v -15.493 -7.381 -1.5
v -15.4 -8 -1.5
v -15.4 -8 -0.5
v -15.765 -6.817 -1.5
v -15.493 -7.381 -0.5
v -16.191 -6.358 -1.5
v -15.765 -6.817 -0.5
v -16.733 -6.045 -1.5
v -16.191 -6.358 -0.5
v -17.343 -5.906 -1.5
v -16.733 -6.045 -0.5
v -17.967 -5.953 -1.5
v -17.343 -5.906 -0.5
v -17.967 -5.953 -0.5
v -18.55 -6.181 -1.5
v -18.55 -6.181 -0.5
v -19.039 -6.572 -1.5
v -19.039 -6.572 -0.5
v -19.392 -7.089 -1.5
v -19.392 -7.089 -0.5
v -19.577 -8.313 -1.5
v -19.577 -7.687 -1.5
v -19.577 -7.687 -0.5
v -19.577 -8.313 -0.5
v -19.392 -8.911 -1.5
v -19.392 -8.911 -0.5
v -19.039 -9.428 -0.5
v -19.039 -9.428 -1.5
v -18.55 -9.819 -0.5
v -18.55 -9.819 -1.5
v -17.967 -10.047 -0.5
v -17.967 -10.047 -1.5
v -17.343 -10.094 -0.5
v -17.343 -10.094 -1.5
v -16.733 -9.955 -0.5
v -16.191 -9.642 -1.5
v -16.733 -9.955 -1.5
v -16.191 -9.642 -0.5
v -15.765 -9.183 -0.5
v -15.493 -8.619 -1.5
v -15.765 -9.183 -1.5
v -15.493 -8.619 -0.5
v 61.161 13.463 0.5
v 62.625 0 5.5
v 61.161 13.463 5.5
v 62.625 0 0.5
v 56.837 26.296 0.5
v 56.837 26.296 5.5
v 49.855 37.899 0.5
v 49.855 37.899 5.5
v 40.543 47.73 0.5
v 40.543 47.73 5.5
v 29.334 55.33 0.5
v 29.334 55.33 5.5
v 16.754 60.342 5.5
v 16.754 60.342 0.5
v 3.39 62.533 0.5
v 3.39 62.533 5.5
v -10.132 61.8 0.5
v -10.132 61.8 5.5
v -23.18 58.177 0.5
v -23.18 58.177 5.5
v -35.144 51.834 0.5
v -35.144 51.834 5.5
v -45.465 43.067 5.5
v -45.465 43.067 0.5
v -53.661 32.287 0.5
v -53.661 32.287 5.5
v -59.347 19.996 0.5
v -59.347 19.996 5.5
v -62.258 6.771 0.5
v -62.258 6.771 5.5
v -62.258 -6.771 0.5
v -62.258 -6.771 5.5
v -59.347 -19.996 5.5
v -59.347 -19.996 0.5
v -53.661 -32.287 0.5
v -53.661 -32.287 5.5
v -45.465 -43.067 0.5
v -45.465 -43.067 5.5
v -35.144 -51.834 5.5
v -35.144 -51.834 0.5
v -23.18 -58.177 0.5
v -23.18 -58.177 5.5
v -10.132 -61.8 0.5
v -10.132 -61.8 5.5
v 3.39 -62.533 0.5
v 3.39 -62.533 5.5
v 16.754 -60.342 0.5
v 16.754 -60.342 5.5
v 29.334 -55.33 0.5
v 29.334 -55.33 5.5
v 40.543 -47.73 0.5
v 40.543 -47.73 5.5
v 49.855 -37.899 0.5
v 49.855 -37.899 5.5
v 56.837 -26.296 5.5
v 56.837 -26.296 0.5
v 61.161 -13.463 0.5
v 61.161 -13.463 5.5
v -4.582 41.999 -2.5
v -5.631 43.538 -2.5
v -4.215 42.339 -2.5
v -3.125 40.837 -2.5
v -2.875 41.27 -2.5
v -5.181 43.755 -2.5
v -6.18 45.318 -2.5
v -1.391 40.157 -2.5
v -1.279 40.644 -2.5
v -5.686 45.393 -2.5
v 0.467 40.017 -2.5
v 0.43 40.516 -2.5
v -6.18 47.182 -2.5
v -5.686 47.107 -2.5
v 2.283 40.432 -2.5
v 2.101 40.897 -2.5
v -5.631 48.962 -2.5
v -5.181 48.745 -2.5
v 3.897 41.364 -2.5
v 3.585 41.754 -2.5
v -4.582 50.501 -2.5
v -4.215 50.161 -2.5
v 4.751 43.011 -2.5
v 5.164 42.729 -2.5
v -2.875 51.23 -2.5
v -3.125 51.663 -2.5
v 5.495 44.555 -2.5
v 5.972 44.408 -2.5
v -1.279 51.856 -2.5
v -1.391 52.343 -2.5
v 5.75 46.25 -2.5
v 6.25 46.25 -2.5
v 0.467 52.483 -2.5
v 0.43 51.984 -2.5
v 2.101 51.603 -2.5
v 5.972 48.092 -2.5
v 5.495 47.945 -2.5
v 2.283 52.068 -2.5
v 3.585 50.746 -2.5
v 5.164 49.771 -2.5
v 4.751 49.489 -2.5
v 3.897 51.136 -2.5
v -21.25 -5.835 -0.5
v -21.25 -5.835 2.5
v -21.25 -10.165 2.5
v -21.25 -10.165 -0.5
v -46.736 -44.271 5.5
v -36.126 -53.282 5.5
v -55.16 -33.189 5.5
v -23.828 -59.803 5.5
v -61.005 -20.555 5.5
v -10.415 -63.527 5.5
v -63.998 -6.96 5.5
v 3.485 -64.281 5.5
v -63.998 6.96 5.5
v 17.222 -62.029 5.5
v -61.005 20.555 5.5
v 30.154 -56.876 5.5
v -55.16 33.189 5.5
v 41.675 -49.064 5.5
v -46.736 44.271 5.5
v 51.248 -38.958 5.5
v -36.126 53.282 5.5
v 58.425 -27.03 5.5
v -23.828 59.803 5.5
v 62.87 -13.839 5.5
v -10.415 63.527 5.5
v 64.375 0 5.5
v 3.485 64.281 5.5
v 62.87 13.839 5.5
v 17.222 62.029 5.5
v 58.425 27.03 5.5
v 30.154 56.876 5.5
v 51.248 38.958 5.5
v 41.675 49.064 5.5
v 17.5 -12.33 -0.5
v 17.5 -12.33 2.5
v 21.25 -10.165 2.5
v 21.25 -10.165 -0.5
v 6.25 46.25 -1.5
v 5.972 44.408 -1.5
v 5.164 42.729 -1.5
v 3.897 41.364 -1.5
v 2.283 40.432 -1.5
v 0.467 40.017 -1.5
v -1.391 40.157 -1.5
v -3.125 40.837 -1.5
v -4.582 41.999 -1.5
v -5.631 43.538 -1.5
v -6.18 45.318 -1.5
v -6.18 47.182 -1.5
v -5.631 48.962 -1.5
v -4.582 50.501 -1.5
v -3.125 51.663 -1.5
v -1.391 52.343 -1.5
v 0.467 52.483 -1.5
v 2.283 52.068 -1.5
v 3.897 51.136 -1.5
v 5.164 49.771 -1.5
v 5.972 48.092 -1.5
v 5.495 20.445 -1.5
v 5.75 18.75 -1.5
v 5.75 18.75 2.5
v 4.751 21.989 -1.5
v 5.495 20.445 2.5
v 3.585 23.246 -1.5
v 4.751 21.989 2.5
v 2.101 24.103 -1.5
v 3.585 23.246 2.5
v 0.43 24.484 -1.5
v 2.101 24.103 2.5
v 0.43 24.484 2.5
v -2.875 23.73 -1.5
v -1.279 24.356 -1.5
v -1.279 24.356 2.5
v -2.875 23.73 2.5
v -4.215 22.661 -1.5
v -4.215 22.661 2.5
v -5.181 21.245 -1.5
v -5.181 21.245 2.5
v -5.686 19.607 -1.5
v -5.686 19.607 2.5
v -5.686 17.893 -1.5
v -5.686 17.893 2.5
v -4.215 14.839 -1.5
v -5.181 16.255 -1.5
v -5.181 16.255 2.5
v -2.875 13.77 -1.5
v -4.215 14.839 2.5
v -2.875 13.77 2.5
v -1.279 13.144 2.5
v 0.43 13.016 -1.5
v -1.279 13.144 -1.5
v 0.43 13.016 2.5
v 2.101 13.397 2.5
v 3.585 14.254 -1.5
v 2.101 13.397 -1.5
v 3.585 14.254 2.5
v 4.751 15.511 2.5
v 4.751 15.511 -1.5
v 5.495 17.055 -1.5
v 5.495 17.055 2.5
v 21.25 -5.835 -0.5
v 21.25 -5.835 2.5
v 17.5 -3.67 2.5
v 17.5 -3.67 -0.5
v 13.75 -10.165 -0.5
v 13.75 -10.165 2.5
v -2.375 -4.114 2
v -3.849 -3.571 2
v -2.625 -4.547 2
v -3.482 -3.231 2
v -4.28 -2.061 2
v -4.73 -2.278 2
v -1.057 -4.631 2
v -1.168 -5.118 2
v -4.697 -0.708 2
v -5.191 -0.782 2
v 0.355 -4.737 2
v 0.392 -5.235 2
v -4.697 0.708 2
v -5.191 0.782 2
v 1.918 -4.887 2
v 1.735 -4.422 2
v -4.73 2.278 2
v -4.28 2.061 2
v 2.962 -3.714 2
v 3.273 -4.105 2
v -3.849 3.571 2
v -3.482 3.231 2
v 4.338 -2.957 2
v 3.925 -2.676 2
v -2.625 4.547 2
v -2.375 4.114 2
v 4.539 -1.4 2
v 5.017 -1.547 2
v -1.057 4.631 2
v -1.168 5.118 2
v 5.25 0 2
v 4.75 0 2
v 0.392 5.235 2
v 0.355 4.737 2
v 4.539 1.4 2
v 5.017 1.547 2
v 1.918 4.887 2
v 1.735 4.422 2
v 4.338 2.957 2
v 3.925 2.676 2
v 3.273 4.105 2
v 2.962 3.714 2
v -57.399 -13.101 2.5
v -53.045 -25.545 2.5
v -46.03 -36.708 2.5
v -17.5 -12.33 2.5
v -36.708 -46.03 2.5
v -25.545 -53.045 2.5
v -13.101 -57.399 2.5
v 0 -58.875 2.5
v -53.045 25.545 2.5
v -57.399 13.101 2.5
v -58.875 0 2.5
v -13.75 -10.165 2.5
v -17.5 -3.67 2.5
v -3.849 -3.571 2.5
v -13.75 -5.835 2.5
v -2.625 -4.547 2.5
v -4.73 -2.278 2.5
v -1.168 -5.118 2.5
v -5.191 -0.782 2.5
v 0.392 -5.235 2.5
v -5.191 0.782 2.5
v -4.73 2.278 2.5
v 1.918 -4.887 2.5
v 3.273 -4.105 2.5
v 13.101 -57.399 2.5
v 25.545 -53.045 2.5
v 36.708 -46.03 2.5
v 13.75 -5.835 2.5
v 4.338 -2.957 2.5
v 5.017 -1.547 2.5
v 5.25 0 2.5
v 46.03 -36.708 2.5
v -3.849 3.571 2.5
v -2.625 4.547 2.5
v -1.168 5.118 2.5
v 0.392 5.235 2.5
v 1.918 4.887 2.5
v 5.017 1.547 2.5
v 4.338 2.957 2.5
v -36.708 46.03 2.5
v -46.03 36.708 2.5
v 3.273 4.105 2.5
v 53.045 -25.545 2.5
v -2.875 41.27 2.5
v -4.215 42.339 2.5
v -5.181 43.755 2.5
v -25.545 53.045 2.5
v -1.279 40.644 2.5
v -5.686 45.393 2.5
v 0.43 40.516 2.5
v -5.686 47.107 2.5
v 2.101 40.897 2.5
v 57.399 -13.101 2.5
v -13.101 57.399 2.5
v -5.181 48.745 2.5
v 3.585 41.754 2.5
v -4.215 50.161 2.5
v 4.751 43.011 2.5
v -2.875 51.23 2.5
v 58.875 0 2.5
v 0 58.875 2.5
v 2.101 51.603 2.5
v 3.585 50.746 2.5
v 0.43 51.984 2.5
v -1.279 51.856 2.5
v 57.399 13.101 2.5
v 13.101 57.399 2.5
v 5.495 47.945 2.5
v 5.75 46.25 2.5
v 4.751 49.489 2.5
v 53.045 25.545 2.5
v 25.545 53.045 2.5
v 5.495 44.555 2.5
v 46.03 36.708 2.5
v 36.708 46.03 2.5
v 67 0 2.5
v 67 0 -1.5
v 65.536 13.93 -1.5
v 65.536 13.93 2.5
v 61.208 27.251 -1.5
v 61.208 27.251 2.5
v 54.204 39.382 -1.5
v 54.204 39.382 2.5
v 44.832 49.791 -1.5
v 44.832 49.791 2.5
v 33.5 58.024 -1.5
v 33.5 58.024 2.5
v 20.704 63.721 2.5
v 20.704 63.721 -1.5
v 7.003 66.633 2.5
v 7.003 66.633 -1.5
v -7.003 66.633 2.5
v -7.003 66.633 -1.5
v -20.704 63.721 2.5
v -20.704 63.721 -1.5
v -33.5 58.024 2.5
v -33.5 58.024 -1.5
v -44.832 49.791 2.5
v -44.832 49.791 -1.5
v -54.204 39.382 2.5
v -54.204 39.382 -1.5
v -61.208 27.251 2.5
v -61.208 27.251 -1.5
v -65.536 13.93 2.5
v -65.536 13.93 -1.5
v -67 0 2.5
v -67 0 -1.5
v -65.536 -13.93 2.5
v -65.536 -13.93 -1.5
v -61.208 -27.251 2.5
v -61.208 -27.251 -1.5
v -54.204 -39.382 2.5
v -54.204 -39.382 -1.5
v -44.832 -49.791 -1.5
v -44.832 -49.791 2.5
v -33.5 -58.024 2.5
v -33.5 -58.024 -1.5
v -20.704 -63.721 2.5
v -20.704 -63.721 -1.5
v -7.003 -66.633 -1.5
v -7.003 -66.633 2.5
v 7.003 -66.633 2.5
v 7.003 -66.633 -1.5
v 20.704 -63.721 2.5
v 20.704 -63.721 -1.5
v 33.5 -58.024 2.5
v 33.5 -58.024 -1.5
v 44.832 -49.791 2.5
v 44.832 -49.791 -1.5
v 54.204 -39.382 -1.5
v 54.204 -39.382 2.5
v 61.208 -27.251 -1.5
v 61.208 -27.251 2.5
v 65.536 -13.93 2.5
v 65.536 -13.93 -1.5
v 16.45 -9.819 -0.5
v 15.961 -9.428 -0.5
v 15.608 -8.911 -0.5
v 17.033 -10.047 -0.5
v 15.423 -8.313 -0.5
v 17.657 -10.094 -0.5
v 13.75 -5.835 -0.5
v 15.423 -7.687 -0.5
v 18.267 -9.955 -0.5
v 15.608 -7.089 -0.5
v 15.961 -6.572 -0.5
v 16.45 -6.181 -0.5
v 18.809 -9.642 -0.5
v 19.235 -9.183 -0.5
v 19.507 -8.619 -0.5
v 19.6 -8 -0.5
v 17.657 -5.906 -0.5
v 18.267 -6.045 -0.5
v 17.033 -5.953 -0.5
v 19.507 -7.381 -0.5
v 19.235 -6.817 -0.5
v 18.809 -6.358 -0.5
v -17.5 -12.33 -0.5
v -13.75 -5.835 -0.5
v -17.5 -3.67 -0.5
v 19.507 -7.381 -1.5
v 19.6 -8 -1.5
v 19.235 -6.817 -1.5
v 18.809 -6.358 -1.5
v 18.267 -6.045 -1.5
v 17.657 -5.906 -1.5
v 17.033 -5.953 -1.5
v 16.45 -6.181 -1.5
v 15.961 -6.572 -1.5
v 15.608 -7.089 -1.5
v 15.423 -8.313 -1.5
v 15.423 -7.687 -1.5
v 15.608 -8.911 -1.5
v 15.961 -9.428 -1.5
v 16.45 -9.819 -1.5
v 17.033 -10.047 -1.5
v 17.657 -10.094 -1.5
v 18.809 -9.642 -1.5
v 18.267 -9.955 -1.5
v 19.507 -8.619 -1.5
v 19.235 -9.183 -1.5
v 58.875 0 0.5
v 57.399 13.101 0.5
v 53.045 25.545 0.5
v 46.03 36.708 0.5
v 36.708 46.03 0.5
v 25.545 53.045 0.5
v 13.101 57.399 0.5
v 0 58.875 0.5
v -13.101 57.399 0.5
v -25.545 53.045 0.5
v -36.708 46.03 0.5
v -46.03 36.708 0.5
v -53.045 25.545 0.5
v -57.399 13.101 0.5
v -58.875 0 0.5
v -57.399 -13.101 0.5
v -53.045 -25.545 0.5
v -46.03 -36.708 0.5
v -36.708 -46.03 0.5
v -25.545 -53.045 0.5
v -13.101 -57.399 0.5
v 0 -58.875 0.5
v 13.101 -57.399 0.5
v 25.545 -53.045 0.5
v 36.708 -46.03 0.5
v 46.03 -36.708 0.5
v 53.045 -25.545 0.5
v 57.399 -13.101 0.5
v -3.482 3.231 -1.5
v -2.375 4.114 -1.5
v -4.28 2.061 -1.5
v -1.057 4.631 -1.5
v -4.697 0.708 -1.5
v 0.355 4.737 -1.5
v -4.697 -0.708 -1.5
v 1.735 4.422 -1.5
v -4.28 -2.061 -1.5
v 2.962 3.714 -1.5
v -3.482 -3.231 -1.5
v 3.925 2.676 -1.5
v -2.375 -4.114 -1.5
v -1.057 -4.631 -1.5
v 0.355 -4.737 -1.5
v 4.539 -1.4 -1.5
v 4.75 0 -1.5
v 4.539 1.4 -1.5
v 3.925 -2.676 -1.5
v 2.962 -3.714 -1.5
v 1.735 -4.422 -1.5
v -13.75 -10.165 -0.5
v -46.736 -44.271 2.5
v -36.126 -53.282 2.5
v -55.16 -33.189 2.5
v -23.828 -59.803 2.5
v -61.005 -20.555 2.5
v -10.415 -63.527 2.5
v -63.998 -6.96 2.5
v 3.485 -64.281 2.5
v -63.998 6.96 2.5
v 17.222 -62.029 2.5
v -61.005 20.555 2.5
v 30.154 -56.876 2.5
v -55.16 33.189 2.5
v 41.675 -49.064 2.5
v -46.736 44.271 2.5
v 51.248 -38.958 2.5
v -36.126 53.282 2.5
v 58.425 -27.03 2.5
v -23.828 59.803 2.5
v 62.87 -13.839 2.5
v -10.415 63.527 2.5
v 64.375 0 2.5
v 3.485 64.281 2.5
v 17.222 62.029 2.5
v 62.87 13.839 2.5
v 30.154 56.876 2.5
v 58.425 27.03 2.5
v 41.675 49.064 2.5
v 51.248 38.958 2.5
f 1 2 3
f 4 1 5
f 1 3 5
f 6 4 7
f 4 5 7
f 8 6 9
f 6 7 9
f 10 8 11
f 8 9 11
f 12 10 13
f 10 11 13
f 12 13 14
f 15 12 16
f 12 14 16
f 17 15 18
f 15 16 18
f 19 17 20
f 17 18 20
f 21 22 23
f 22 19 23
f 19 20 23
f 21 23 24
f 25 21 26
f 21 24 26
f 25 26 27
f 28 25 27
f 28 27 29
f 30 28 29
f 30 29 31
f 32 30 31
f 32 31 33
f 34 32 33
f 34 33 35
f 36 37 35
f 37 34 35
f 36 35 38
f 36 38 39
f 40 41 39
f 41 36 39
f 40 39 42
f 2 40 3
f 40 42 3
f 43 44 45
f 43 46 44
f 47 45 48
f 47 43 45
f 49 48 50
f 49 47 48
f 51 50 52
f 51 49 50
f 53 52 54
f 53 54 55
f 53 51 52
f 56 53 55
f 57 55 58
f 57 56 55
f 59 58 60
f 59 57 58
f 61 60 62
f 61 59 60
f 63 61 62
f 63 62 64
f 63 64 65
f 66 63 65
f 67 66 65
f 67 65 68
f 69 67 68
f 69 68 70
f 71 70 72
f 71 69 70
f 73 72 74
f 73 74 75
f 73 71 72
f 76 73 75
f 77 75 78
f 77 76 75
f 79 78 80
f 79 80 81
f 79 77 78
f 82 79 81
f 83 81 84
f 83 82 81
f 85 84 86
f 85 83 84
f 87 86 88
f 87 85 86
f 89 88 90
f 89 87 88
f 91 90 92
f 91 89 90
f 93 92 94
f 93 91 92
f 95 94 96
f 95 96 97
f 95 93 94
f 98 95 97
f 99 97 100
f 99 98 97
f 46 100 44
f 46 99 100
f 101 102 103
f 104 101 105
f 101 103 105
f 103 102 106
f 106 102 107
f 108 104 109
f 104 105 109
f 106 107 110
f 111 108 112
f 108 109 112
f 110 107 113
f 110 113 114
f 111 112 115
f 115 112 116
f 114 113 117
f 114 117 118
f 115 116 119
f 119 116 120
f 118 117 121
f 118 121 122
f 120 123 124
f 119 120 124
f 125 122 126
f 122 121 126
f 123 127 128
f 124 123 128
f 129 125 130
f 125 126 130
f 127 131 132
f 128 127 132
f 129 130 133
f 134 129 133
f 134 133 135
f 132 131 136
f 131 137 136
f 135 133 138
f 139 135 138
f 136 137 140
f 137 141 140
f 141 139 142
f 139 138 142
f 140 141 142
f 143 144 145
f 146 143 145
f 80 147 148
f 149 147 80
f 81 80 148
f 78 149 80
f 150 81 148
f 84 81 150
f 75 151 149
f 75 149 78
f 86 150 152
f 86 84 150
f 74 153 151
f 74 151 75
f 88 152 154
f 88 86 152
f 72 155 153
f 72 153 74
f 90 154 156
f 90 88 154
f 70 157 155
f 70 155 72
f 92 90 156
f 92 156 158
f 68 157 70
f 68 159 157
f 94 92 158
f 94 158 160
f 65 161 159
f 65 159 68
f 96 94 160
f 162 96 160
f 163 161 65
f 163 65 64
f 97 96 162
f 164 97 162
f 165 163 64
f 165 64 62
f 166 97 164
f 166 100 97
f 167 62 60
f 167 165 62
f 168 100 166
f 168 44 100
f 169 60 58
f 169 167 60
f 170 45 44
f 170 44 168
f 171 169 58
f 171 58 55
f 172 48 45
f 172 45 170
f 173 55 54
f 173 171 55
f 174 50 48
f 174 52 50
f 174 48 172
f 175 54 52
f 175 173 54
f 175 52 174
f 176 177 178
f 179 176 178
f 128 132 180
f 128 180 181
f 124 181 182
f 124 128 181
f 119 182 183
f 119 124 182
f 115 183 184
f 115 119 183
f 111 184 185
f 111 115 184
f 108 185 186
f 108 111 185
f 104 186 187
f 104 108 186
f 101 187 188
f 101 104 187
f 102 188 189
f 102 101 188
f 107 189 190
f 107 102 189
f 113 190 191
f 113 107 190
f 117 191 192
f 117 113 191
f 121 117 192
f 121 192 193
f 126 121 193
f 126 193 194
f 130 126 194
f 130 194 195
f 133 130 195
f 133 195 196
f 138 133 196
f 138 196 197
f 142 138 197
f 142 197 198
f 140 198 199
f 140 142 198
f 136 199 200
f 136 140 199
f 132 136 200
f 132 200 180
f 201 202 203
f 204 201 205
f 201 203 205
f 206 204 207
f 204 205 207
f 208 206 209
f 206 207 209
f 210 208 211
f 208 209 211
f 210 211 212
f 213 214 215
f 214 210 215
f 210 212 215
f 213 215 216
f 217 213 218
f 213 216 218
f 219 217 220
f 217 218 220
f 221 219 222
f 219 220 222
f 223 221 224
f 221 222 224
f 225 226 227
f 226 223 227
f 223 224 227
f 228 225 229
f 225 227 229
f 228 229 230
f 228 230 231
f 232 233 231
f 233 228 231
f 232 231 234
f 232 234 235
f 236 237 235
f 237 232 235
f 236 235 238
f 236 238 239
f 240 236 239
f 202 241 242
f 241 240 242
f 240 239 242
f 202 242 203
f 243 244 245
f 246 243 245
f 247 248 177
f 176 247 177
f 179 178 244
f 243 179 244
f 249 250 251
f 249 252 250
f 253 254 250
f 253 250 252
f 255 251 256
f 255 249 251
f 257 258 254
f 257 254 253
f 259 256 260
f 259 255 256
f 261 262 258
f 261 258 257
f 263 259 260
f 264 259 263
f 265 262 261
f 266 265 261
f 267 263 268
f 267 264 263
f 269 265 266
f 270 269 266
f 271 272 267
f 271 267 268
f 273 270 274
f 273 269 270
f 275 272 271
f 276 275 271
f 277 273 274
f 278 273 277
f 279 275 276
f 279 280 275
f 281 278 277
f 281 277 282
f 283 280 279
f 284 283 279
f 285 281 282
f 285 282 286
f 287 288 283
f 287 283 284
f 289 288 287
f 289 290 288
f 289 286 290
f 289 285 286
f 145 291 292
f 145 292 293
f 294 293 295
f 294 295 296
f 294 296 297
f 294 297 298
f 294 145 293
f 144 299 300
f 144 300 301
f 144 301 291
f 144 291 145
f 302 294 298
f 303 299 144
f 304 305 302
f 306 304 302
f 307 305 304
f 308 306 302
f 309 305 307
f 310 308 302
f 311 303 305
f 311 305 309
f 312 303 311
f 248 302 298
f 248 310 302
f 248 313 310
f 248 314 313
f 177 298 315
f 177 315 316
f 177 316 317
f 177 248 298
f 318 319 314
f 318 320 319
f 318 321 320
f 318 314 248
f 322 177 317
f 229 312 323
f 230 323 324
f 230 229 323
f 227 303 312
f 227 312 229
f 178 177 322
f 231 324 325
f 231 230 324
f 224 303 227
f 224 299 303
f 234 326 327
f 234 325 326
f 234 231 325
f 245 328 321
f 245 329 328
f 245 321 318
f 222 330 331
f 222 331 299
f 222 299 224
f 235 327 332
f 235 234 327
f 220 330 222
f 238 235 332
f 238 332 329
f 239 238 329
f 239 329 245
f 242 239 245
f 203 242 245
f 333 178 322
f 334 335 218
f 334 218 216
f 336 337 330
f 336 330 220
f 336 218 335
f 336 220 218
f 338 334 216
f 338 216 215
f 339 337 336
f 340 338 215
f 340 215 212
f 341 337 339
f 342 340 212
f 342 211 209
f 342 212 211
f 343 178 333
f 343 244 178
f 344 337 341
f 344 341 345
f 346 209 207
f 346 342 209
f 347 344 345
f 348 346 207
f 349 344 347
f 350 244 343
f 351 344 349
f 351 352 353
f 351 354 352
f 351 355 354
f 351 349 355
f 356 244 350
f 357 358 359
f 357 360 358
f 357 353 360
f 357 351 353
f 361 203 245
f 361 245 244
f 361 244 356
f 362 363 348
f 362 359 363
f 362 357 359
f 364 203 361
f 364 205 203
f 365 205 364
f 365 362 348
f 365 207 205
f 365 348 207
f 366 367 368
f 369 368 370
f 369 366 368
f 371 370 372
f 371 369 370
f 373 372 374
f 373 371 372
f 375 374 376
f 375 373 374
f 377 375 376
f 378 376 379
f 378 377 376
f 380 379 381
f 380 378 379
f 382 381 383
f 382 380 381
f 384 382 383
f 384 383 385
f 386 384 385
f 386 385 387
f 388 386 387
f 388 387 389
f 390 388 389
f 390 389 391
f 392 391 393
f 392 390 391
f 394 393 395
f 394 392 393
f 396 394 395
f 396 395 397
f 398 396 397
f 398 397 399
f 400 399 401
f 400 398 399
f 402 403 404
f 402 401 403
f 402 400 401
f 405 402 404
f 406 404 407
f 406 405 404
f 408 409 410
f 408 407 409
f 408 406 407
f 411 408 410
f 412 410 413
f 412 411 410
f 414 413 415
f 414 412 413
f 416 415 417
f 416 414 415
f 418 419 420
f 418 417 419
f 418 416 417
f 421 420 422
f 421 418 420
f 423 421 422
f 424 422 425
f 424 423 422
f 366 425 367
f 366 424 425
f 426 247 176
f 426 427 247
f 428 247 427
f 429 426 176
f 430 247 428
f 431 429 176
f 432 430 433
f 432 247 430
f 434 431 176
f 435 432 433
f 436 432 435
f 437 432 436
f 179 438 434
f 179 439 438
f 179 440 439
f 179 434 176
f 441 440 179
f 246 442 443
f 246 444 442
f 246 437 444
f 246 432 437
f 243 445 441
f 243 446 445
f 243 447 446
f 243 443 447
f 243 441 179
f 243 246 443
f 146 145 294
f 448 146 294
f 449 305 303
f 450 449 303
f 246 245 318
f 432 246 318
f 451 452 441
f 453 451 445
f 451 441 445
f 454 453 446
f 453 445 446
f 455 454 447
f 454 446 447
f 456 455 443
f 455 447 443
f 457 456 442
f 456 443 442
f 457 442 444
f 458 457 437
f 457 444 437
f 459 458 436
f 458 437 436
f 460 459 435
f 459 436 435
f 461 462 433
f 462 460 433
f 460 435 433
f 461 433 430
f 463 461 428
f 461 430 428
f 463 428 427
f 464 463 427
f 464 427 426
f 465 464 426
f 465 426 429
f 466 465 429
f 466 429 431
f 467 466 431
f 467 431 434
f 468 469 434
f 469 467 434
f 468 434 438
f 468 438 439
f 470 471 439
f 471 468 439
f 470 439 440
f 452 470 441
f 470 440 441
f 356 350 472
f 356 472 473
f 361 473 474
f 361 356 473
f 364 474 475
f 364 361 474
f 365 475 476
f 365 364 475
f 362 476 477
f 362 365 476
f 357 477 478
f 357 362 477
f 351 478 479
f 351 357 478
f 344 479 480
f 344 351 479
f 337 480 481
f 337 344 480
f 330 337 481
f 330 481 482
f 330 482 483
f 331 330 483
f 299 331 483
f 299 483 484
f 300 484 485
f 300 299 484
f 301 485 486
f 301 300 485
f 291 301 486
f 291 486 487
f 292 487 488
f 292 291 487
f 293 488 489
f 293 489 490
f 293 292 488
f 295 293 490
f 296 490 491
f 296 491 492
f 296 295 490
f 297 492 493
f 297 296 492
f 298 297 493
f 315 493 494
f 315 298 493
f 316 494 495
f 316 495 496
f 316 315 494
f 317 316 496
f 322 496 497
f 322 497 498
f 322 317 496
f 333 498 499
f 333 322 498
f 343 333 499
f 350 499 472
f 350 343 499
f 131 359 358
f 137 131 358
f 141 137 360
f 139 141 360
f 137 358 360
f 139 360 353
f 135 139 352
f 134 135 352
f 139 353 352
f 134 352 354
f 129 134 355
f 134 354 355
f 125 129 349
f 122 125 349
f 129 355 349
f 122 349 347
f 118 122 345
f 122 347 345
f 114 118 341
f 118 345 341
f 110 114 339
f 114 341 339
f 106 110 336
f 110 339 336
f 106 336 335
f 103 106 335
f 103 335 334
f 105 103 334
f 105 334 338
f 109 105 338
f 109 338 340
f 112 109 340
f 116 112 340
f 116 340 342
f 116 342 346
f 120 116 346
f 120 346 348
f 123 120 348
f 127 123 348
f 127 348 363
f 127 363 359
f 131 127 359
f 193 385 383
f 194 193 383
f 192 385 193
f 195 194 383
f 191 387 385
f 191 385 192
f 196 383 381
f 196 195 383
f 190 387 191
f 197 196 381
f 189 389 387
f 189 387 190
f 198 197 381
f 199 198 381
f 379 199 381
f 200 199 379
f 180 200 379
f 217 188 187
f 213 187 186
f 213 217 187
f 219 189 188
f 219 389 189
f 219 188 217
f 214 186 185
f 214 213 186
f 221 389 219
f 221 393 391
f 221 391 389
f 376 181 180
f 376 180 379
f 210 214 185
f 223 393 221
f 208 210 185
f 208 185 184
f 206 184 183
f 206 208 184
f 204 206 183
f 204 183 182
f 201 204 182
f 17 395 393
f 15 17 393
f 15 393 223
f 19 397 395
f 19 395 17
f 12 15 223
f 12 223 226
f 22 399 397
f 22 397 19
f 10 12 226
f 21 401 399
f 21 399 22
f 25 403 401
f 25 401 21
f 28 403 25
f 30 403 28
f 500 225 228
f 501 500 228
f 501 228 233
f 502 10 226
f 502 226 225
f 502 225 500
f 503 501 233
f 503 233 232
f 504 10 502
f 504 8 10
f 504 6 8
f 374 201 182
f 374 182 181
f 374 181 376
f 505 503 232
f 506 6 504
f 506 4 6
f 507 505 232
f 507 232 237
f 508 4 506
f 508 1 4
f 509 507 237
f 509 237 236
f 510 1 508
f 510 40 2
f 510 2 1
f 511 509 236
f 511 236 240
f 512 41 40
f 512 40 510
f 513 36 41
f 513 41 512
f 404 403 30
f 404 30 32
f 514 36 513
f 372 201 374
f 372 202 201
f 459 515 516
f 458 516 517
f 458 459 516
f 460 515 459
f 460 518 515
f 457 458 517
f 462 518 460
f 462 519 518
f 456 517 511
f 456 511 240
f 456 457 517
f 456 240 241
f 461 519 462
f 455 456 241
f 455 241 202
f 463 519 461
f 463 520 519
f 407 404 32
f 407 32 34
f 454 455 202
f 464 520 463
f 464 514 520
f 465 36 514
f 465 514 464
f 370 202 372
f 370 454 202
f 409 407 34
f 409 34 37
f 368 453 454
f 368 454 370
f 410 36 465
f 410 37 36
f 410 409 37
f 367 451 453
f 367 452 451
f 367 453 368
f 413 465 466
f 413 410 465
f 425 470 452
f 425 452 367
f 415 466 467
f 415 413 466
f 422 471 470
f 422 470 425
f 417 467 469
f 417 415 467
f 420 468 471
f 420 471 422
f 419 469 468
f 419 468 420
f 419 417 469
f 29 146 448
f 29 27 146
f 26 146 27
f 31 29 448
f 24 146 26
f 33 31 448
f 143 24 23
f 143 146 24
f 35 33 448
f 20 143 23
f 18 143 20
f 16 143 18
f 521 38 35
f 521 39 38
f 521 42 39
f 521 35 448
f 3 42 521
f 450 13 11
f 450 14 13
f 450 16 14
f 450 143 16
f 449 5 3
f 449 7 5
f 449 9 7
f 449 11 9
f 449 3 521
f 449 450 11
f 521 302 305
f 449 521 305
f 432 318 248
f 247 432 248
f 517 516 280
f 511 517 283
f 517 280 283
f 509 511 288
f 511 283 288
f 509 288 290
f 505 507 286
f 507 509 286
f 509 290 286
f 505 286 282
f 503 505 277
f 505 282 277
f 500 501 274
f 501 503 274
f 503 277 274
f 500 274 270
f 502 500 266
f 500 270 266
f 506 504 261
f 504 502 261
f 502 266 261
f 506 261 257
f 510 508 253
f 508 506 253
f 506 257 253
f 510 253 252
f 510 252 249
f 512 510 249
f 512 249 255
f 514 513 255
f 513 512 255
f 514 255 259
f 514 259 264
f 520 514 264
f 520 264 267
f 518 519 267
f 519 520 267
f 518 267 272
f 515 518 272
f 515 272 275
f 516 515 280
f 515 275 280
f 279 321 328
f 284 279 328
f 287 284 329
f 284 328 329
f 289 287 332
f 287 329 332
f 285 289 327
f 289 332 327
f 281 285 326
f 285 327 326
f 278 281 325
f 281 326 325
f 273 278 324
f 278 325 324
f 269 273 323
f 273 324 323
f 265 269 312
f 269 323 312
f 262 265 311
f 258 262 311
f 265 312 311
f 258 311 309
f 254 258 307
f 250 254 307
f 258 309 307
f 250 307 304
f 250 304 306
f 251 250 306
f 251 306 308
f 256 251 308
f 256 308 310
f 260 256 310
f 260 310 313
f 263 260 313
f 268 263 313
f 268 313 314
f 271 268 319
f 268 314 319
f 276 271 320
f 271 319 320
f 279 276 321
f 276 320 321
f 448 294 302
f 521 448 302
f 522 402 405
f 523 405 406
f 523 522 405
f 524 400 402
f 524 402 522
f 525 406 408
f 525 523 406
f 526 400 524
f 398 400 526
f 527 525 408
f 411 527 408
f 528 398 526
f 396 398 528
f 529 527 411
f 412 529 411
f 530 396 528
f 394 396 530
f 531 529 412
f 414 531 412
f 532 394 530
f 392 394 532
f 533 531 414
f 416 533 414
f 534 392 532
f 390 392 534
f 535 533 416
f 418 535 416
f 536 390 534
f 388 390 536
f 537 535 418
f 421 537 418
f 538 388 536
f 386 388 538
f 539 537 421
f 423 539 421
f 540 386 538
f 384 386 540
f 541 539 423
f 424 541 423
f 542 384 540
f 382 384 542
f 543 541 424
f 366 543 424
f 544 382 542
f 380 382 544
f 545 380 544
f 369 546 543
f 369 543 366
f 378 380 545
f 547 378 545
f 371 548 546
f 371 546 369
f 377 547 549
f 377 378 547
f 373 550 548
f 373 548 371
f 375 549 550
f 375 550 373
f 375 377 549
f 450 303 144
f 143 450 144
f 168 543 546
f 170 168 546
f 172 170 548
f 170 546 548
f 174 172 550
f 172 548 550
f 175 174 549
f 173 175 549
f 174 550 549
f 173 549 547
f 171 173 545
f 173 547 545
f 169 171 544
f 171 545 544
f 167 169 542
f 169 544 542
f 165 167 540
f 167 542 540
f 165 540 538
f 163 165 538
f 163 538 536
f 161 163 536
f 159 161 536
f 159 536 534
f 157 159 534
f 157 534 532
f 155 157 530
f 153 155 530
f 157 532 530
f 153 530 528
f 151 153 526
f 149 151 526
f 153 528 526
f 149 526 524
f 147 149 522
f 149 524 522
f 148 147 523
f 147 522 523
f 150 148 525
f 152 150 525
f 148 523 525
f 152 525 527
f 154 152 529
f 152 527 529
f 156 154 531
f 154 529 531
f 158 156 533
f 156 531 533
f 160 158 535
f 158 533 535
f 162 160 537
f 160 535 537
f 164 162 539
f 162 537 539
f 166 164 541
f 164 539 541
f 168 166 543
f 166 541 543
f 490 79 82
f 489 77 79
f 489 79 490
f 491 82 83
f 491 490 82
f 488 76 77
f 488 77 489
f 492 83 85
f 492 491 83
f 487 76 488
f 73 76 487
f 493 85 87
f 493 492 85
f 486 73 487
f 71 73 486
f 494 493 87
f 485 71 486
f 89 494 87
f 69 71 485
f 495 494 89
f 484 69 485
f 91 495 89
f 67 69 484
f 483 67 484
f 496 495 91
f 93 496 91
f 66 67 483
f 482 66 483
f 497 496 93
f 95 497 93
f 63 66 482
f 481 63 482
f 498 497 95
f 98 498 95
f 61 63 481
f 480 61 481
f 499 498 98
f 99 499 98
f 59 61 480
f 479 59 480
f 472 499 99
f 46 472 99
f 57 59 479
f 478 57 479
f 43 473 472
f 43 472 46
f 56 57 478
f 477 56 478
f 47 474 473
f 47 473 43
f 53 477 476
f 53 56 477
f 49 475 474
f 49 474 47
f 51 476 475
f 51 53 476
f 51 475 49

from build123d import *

# Parameters (mm, degrees)
F0_R      = 67
F1_DEPTH  = 2.5
F2_R      = 64.375
F2_R_2    = 62.625
F3_DEPTH  = 3
F2_R_3    = 58.875
F4_DEPTH  = 2
F5_R      = 4.75
F5_R_2    = 5.75
F5_R_3    = 2.1
F6_DEPTH  = 5.001
F7_R      = 5.25
F7_R_2    = 4.75
F8_DEPTH  = 0.5
F7_R_3    = 2.1
F9_DEPTH  = 3
F10_DEPTH = 3
F11_R     = 67
F11_R_2   = 6.25
F11_R_3   = 2.1
F11_R_4   = 4.75
F11_R_5   = 5.75
F12_DEPTH = 1


with BuildPart() as f1:
    # F0 (on Top) → F1 (new body, symmetric)
    with BuildSketch(Plane.XY):
        Circle(F0_R)
    extrude(amount=F1_DEPTH, both=True)

    # F2 (on face) → F3 (join)
    with BuildSketch(Plane.XY.offset(2.5)):
        Circle(F2_R)
        Circle(F2_R_2, mode=Mode.SUBTRACT)
    extrude(amount=F3_DEPTH)

    # F2 (on face) → F4 (cut)
    with BuildSketch(Plane.XY.offset(2.5)):
        Circle(F2_R_2)
        Circle(F2_R_3, mode=Mode.SUBTRACT)
    extrude(amount=-F4_DEPTH, mode=Mode.SUBTRACT)

    # F5 (on face) → F6 (cut, through all)
    with BuildSketch(Plane.XY.offset(2.5)):
        Circle(F5_R)
        with Locations((0, 18.75)):
            Circle(F5_R_2)
        with Locations((0, 46.25)):
            Circle(F5_R_2)
        with Locations((17.5, -8)):
            Circle(F5_R_3)
        with Locations((-17.5, -8)):
            Circle(F5_R_3)
    extrude(amount=-F6_DEPTH, mode=Mode.SUBTRACT)

    # F7 (on face) → F8 (cut)
    with BuildSketch(Plane.XY.offset(2.5)):
        Circle(F7_R)
        Circle(F7_R_2, mode=Mode.SUBTRACT)
    extrude(amount=-F8_DEPTH, mode=Mode.SUBTRACT)

    # F7 (on face) → F9 (cut)
    with BuildSketch(Plane.XY.offset(2.5)):
        Polygon((-13.75, -10.1650635095), (-13.75, -5.8349364905), (-17.5, -3.6698729811), (-21.25, -5.8349364905), (-21.25, -10.1650635095), (-17.5, -12.3301270189), align=None)
        with Locations((-17.5, -8)):
            Circle(F7_R_3, mode=Mode.SUBTRACT)
        with Locations((-17.5, -8)):
            Circle(F7_R_3)
    extrude(amount=-F9_DEPTH, mode=Mode.SUBTRACT)

    # F7 (on face) → F10 (cut)
    with BuildSketch(Plane.XY.offset(2.5)):
        Polygon((17.5, -12.3301270189), (21.25, -10.1650635095), (21.25, -5.8349364905), (17.5, -3.6698729811), (13.75, -5.8349364905), (13.75, -10.1650635095), align=None)
        with Locations((17.5, -8)):
            Circle(F7_R_3, mode=Mode.SUBTRACT)
        with Locations((17.5, -8)):
            Circle(F7_R_3)
    extrude(amount=-F10_DEPTH, mode=Mode.SUBTRACT)

    # F11 (on face) → F12 (cut)
    with BuildSketch(Plane(origin=(0, 0, -2.5), x_dir=(1, 0, 0), z_dir=(0, 0, -1))):
        Circle(F11_R)
        with Locations((0, -46.25)):
            Circle(F11_R_2, mode=Mode.SUBTRACT)
        with Locations((0, -18.75)):
            Circle(F11_R_2, mode=Mode.SUBTRACT)
        with Locations((-17.5, 8)):
            Circle(F11_R_3, mode=Mode.SUBTRACT)
        Circle(F11_R_4, mode=Mode.SUBTRACT)
        with Locations((17.5, 8)):
            Circle(F11_R_3, mode=Mode.SUBTRACT)
        with Locations((0, -18.75)):
            Circle(F11_R_2)
        with Locations((0, -18.75)):
            Circle(F11_R_5, mode=Mode.SUBTRACT)
    extrude(amount=-F12_DEPTH, mode=Mode.SUBTRACT)


solid = f1.part
